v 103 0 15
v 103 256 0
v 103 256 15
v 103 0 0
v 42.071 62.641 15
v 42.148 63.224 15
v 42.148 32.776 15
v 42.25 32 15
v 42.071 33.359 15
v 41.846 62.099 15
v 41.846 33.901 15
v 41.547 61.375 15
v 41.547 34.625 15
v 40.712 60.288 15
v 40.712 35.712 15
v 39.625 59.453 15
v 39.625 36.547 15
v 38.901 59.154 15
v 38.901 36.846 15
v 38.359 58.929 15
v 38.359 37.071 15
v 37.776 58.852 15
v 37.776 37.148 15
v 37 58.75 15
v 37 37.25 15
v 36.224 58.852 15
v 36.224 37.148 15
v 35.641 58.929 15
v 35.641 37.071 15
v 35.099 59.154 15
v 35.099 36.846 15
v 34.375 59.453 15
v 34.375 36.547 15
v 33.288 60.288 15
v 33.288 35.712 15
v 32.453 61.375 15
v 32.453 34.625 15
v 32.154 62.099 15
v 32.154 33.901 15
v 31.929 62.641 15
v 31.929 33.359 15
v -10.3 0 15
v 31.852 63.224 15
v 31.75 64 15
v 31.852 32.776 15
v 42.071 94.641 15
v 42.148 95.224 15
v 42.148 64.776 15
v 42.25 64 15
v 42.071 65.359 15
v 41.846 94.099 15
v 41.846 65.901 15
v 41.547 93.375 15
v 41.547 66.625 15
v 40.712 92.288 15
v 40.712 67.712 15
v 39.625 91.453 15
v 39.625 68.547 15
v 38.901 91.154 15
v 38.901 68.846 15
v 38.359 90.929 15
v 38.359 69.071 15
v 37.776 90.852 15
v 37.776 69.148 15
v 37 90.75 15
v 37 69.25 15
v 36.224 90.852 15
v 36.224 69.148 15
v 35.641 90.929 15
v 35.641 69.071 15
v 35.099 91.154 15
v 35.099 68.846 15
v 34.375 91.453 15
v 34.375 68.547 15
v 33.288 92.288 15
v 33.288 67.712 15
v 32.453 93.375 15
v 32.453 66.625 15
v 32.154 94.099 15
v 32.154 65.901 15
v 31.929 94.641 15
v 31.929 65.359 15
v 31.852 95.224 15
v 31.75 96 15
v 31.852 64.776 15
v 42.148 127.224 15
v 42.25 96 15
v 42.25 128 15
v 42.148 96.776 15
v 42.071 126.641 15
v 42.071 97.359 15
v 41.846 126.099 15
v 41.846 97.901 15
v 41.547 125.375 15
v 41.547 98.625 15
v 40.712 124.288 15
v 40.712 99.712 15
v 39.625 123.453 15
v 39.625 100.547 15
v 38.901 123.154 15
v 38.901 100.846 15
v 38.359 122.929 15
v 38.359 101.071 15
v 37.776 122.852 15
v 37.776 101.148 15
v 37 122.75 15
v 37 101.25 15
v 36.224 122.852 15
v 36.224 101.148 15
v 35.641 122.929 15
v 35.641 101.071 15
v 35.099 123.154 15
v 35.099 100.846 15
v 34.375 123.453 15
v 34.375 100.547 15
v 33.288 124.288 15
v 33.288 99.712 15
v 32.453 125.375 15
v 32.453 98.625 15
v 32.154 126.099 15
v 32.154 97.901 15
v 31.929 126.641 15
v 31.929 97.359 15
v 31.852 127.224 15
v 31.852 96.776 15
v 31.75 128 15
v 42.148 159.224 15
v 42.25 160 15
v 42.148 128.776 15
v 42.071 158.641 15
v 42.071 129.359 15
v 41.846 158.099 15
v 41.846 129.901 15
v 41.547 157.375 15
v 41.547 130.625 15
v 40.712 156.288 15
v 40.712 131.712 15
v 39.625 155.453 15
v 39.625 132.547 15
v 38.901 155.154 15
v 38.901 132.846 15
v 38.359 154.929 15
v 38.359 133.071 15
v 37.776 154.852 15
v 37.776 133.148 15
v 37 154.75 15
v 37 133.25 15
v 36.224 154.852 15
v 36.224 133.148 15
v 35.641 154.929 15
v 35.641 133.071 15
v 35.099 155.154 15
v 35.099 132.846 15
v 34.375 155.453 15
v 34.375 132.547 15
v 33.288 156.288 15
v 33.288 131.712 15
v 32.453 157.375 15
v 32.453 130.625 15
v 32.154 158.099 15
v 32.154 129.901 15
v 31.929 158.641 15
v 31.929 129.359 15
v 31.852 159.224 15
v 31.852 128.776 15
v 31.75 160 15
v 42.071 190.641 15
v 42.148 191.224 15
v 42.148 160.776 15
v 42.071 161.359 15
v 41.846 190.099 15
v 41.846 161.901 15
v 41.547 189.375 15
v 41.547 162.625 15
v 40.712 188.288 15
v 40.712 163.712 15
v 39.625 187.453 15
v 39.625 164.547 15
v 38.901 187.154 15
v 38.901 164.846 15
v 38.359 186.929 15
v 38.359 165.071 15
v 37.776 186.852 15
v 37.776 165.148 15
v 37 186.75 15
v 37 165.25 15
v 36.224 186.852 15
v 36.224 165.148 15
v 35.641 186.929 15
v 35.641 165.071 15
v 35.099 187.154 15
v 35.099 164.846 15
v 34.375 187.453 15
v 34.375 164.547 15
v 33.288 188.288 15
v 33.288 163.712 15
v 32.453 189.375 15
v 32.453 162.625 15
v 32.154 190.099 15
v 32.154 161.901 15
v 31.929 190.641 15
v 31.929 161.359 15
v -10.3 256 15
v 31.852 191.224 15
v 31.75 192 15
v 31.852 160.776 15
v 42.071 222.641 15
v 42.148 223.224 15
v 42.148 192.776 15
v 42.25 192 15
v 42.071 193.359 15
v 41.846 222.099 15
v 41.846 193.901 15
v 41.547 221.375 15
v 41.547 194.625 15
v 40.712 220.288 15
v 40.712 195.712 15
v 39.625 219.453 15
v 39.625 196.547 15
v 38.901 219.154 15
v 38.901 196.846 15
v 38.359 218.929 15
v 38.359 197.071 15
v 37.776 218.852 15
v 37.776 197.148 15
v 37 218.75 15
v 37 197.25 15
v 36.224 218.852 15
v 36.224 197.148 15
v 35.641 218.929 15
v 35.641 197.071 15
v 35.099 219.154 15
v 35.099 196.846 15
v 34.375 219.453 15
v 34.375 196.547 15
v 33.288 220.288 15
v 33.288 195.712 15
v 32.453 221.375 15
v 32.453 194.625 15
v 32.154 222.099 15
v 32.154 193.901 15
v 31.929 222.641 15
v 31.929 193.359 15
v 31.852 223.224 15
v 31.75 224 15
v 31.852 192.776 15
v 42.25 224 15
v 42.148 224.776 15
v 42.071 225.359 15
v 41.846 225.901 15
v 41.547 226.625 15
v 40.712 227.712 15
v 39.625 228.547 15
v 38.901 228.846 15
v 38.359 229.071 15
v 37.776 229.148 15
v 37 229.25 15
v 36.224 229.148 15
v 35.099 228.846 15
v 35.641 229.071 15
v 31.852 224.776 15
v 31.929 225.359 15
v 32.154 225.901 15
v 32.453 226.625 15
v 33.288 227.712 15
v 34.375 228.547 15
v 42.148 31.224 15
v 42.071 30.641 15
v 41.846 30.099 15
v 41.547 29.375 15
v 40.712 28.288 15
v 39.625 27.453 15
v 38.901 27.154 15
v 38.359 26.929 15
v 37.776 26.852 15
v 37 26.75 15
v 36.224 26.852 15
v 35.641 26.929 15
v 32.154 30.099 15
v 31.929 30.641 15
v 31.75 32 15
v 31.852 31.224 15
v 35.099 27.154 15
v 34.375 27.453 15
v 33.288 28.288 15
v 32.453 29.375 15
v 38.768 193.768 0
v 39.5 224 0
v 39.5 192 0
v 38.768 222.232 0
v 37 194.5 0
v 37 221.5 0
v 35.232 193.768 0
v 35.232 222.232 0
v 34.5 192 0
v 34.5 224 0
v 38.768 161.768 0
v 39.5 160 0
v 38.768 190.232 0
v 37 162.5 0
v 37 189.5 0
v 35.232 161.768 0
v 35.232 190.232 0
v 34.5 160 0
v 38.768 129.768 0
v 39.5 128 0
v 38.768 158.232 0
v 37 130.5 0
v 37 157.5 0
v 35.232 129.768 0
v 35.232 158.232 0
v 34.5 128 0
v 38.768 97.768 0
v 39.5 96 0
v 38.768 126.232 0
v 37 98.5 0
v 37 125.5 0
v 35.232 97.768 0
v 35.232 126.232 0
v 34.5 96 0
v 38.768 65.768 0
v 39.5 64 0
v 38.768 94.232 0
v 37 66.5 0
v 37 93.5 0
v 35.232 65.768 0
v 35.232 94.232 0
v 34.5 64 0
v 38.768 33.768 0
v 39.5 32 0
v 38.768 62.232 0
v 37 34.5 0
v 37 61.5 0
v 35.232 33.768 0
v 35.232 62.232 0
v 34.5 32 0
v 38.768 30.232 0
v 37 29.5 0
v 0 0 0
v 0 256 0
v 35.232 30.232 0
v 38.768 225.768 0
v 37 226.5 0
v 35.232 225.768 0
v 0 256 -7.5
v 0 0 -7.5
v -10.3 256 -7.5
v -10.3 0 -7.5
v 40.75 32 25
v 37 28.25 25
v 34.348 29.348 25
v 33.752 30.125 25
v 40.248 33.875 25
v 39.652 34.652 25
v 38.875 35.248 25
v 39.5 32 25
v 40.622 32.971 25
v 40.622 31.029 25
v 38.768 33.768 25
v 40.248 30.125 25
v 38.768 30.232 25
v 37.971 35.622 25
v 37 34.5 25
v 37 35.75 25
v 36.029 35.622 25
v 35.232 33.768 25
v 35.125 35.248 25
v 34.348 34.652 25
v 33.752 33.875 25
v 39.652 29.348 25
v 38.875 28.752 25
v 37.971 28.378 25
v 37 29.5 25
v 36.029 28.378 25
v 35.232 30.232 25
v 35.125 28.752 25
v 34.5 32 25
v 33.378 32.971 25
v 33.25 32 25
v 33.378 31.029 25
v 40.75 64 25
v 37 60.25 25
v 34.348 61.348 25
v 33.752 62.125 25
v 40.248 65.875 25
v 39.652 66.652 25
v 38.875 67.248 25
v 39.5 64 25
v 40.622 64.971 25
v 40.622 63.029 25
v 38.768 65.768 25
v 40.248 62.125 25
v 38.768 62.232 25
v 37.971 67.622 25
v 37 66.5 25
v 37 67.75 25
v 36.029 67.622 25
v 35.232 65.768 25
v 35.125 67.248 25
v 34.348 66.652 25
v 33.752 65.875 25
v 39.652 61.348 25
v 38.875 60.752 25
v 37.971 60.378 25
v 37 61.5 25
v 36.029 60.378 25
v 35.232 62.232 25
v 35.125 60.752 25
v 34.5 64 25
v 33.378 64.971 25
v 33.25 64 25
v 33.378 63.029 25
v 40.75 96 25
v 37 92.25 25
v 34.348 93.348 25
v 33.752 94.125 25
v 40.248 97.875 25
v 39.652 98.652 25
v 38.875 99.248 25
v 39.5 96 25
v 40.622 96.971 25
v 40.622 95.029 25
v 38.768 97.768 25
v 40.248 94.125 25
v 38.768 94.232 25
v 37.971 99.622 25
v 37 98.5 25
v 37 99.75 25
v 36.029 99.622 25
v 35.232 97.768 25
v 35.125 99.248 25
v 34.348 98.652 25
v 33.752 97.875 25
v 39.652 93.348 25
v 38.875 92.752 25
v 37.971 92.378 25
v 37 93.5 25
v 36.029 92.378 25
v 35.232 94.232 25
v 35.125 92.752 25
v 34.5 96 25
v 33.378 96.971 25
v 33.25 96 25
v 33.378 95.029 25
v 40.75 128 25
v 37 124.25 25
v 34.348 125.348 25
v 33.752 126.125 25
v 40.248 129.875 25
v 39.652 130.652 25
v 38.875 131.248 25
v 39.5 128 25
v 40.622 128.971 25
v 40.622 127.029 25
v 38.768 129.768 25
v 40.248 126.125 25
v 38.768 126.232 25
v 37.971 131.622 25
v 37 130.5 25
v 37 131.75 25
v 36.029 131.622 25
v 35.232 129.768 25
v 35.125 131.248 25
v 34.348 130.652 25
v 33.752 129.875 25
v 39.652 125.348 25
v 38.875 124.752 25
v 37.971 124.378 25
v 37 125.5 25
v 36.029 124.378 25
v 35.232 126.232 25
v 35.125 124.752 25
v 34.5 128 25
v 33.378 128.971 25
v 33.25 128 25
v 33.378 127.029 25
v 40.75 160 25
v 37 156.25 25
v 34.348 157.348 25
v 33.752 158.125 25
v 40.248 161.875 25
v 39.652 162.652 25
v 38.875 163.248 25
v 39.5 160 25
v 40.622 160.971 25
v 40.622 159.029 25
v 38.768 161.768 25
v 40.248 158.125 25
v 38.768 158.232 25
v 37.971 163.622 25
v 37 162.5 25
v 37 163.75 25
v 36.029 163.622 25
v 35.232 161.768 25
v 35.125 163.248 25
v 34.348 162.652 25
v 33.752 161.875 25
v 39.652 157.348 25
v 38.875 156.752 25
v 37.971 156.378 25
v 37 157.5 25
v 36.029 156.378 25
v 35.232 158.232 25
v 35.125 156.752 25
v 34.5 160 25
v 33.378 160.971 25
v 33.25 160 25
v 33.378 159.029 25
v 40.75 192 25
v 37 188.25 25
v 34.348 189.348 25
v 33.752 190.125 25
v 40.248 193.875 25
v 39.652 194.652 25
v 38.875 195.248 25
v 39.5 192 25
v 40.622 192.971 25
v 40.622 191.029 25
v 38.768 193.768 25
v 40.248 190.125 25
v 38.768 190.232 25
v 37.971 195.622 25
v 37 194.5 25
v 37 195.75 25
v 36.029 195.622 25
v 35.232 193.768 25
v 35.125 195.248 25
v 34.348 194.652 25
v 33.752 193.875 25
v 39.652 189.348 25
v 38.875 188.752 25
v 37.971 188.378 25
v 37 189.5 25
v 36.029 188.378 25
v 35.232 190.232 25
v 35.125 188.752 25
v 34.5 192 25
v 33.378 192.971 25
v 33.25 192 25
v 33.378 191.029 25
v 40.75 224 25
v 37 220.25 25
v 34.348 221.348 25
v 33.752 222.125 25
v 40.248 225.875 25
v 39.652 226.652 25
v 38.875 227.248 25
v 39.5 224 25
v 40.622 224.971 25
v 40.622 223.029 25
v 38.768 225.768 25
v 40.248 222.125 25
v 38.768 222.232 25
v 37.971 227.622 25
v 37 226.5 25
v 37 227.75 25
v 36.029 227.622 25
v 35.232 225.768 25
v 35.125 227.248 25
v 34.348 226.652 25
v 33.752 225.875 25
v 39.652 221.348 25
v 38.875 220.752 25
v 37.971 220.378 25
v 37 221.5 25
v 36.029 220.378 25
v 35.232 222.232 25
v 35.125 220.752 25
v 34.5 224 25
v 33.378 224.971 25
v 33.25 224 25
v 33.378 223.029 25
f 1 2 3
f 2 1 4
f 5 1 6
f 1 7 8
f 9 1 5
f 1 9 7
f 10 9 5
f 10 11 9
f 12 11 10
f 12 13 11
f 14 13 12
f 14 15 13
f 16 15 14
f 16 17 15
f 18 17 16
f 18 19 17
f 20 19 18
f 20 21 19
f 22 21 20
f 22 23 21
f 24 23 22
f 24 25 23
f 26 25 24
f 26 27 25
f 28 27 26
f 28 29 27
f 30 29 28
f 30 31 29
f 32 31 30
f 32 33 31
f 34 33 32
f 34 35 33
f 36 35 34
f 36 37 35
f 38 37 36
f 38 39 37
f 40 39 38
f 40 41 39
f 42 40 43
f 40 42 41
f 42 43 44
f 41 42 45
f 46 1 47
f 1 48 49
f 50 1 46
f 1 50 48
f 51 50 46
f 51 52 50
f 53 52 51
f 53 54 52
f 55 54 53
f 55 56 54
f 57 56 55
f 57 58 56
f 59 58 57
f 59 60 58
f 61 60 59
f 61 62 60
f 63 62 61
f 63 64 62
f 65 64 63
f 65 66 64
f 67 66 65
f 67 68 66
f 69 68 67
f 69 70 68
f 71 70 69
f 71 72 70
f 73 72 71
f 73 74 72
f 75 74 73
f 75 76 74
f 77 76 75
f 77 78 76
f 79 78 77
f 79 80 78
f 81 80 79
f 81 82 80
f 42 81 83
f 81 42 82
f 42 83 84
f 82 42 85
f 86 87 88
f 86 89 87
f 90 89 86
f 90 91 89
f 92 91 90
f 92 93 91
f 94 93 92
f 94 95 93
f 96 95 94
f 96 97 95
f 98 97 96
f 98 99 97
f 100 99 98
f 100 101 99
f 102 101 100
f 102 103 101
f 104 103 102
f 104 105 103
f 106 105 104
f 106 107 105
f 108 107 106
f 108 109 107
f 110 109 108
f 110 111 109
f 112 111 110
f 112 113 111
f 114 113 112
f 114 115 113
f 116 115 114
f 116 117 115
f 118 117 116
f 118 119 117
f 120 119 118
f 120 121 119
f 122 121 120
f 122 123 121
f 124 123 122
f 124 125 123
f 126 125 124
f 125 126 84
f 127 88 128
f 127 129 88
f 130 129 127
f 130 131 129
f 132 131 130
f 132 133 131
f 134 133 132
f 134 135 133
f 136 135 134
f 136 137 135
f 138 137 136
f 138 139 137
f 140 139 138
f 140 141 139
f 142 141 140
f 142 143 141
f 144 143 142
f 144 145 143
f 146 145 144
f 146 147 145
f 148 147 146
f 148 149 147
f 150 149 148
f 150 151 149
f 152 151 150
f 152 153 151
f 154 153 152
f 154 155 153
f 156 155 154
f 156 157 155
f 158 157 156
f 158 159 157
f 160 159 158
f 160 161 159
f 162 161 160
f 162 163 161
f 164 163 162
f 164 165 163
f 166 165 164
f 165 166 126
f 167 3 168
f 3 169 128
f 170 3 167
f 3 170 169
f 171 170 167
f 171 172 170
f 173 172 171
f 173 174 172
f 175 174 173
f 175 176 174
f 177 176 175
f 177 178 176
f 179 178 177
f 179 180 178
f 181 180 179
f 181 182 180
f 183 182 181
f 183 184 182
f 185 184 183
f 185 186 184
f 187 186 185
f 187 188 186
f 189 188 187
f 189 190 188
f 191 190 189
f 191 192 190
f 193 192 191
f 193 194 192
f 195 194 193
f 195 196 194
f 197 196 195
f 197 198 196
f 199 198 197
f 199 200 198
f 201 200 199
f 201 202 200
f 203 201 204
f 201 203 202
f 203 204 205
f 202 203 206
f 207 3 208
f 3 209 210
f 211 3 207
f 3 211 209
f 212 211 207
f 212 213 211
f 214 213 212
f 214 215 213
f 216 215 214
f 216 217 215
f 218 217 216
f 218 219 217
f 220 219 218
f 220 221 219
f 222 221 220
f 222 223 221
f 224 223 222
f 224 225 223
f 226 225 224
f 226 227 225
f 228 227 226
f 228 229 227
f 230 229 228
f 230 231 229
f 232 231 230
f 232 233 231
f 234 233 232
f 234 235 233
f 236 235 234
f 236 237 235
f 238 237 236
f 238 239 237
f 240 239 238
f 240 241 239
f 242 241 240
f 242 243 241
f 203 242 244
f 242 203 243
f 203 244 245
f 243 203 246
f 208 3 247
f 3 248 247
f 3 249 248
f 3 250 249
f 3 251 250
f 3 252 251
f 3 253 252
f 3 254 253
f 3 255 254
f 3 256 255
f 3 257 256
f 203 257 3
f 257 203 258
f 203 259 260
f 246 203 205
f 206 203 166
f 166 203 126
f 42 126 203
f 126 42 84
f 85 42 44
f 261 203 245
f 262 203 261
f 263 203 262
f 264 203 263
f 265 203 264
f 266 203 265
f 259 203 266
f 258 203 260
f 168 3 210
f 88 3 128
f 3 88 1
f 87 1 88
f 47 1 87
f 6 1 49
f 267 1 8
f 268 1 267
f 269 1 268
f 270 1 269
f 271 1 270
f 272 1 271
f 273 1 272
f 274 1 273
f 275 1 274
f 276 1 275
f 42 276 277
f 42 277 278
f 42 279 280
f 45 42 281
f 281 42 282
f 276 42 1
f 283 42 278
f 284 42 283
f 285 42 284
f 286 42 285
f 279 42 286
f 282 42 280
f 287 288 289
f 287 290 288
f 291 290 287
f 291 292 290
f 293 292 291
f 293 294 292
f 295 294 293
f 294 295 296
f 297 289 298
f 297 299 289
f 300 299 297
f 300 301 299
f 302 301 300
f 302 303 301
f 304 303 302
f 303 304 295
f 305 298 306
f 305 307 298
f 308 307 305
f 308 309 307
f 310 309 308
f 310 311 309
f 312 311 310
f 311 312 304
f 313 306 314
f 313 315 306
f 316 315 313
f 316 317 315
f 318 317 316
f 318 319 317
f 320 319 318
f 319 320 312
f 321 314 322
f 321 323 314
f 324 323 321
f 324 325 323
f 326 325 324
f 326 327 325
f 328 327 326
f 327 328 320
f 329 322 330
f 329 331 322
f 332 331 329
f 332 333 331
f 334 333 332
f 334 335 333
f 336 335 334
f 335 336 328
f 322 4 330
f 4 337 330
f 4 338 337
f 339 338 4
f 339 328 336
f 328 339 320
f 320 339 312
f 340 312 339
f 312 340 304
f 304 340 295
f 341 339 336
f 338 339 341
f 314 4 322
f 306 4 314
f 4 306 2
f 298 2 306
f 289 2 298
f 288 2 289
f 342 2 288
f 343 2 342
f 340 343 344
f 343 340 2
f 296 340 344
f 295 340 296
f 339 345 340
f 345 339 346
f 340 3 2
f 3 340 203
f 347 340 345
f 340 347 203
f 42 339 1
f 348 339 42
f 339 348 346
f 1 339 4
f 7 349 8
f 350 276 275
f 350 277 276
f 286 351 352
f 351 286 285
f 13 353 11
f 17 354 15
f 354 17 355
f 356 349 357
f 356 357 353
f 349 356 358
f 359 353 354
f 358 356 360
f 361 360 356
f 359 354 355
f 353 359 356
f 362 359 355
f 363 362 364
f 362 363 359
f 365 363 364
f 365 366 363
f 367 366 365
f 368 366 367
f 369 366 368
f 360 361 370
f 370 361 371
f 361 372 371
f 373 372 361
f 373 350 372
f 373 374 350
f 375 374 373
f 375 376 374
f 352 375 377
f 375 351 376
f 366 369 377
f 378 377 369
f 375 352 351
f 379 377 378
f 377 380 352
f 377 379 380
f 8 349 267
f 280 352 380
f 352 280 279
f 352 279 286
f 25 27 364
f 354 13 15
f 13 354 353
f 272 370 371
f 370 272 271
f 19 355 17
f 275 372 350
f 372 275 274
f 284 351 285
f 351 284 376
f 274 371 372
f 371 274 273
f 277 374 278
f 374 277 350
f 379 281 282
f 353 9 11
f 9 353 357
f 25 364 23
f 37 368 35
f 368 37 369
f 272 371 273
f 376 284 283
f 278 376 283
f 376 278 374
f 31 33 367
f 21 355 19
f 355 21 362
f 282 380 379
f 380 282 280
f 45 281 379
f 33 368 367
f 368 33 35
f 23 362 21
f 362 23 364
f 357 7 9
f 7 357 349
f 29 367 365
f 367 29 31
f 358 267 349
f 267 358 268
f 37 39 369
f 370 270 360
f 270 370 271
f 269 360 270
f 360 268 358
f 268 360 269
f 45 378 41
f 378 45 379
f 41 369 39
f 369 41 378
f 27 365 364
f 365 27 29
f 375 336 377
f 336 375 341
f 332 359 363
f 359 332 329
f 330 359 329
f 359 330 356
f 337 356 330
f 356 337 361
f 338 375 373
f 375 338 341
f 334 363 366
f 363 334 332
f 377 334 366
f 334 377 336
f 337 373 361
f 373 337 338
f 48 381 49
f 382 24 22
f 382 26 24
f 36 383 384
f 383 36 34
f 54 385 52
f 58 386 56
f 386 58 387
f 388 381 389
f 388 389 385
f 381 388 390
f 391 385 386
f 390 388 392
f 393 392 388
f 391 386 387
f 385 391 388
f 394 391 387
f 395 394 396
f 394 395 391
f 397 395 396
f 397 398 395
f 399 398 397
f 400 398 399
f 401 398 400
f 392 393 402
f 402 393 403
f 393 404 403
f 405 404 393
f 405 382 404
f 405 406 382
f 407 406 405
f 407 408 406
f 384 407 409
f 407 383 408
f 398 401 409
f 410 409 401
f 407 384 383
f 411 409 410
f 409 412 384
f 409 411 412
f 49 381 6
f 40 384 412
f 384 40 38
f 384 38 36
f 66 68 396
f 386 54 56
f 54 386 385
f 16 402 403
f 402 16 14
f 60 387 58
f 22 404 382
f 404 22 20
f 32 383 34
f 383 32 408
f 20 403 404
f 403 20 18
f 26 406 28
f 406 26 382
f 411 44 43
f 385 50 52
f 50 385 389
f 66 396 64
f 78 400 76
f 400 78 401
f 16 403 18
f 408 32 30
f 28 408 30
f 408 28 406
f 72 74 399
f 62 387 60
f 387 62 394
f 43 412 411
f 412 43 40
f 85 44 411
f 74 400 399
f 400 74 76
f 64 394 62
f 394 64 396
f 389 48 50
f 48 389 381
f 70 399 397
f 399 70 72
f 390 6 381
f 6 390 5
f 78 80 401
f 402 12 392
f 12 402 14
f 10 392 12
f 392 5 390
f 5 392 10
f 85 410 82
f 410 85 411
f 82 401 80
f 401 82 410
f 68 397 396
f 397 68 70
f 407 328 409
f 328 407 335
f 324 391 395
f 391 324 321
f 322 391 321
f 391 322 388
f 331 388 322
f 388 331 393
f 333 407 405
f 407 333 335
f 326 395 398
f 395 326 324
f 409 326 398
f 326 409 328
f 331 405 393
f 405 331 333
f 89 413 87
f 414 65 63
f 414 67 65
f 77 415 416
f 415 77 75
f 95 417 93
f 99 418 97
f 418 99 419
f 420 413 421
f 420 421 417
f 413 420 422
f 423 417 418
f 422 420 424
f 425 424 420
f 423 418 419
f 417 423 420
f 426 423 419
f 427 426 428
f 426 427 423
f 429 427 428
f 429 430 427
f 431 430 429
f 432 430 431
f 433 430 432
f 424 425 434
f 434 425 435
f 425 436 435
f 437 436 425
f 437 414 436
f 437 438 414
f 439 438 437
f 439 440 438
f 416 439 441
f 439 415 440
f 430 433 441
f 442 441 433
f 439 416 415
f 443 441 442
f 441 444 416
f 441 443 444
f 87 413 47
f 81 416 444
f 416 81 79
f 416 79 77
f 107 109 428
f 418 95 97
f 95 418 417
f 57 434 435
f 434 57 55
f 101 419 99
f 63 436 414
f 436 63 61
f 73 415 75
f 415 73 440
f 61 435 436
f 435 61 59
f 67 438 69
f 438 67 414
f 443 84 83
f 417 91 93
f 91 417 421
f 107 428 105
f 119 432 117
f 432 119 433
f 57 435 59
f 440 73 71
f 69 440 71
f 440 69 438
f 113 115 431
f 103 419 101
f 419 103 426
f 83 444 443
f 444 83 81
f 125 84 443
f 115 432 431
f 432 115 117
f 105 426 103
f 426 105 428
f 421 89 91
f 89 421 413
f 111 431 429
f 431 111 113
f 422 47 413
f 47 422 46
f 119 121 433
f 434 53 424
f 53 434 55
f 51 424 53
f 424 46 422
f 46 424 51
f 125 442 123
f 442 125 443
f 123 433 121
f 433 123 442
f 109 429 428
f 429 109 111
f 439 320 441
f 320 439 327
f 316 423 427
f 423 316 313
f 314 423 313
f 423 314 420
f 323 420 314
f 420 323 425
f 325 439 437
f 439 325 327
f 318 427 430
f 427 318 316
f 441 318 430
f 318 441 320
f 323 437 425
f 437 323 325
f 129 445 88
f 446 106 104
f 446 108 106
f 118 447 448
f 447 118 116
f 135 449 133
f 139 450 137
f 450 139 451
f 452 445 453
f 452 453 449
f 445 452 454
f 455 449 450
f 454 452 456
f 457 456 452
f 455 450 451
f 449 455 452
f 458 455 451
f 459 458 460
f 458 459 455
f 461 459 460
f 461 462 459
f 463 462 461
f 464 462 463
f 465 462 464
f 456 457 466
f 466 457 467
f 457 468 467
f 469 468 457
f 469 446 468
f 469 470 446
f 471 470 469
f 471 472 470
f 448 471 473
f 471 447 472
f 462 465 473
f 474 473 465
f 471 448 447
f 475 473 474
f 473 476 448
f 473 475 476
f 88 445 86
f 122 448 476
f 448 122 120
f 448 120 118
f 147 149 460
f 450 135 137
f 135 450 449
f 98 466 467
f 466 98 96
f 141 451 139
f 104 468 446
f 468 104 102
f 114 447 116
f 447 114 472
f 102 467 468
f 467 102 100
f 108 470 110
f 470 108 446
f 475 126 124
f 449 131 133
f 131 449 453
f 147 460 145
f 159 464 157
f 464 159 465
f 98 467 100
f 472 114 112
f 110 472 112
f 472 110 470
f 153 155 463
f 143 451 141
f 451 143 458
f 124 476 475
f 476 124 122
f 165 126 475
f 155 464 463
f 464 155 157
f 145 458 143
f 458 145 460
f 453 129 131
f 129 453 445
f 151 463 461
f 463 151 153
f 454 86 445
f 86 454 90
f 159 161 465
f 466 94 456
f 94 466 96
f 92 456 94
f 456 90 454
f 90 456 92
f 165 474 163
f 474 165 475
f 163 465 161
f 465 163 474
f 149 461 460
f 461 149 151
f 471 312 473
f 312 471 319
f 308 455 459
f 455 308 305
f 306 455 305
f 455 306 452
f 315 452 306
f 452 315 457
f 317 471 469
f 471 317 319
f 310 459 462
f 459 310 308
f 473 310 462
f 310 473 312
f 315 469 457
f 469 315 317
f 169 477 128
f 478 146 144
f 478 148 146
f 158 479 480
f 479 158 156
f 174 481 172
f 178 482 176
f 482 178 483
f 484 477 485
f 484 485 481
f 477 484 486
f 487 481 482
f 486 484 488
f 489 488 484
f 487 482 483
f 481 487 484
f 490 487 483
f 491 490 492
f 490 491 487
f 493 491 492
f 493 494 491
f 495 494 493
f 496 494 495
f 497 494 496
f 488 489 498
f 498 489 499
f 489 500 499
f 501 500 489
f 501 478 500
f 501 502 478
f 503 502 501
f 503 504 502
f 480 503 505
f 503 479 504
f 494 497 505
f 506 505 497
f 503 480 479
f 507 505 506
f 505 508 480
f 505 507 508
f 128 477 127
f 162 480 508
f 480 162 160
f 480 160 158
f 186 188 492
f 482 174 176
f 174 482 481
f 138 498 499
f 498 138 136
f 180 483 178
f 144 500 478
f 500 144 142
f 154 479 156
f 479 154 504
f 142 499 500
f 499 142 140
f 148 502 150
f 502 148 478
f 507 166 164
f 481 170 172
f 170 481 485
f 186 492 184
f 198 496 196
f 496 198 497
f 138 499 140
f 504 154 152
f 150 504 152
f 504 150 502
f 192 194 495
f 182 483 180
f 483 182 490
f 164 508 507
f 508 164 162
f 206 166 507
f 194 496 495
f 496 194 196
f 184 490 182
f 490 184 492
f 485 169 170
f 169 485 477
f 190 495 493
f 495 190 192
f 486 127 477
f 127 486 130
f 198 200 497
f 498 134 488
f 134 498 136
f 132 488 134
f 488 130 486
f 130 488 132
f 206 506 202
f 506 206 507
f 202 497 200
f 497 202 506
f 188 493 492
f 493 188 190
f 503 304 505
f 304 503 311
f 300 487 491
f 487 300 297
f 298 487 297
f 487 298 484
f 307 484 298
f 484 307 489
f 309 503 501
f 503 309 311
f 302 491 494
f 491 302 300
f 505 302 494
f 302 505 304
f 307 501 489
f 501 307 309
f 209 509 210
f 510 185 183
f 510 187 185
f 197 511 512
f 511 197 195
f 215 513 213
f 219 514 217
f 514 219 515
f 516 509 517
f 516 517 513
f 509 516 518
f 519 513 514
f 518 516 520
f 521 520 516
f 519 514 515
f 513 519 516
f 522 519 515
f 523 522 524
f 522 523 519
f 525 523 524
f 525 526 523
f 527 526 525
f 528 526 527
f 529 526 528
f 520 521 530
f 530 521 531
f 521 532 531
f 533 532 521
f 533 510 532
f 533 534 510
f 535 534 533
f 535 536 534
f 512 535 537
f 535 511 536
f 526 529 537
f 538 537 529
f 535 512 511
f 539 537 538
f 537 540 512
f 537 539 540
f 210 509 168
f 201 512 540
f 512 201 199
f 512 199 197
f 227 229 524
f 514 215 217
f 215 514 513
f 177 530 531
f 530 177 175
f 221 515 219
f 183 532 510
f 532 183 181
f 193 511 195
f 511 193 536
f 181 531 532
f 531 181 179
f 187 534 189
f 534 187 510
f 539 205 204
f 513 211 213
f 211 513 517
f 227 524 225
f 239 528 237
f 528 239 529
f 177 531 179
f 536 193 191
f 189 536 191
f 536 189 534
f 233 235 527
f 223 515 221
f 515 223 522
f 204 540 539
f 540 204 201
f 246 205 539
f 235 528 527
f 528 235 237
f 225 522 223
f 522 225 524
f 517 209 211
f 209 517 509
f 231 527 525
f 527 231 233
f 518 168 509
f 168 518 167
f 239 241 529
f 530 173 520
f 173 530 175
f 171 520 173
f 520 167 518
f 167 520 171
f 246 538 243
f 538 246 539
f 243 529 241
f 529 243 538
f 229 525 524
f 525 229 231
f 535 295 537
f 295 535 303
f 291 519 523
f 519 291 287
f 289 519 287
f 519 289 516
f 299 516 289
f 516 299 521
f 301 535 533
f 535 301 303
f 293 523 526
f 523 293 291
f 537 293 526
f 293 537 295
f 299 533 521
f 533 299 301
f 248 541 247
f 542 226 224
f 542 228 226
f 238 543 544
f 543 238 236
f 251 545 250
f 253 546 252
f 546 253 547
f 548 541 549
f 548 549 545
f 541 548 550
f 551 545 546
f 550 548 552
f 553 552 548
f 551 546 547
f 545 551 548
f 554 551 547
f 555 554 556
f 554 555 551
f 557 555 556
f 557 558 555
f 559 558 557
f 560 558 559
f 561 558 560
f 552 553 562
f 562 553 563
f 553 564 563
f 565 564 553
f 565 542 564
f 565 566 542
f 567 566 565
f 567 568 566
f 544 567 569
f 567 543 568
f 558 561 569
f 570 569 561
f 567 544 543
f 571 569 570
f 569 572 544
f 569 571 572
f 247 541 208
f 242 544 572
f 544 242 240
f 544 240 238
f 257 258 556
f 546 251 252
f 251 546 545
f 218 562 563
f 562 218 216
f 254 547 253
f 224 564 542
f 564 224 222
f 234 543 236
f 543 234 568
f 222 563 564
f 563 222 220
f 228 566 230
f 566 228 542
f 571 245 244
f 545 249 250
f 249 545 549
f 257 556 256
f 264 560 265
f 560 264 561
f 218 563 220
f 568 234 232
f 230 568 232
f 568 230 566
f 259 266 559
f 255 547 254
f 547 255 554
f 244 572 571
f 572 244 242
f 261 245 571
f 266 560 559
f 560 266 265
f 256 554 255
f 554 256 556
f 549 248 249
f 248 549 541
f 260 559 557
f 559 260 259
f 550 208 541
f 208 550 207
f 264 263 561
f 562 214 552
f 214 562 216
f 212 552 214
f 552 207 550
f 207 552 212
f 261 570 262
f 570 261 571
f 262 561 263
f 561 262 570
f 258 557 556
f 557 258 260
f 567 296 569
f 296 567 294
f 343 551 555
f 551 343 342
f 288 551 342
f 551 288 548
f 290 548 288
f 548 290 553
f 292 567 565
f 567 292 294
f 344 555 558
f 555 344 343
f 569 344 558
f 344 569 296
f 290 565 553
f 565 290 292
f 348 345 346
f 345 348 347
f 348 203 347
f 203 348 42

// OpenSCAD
//cabinet shelf hole guide/jig

//Diameter of the pin default 5mm
holeDiameter =5;
//Distance between each hole default 32mm
holeOffset=32;
//Number of holes in jig
numberHoles = 7;

//103 allows for 37mm on one side of the hole and 66mm on the other (1-1/2inch, 2-1/2inch)
width=103; 
height=15;

//Short side lip (1 enabled, 0 disabled)
sideOneLip=1;

//Long side lip (1 enabled, 0 disabled)
sideTwoLip=0;

length=(numberHoles+1)*holeOffset;

//Depth of hole in board (stopper height) Take length of drill bit in mm less the desired hole depth, pins push in 8mm so maybe aim for a depth of 10mm
stopperDepth=25;


lipWidth=0.1*width;




module hole(x,y){

	
	translate([x,y,0]){
    difference(){
	cylinder(stopperDepth,d1=3*holeDiameter,d2=1.5*holeDiameter,true);
	translate([0,0,-1]){cylinder(2+stopperDepth,d=holeDiameter,true);}
	}
	}
    
}

module peg(x,y){

	translate([x,y,-1]){
    cylinder(stopperDepth,d=1.5*holeDiameter,true);
	}
	
}

module holes(){
for(a=[1:numberHoles]){
	hole(37,holeOffset*a);
}
}

module pegs(){
	for(a=[1:numberHoles]){
		peg(37,holeOffset*a);
	}
}



//base
difference(){
	
	cube([width, length, height]);
	pegs();	
	}


holes();

if(sideOneLip){
	translate([-lipWidth,0,-height*0.5]){
	cube([lipWidth,length,height*1.5]);
}}

if(sideTwoLip){
	translate([width,0,-height*0.5]){
	cube([lipWidth,length,height*1.5]);
}}
